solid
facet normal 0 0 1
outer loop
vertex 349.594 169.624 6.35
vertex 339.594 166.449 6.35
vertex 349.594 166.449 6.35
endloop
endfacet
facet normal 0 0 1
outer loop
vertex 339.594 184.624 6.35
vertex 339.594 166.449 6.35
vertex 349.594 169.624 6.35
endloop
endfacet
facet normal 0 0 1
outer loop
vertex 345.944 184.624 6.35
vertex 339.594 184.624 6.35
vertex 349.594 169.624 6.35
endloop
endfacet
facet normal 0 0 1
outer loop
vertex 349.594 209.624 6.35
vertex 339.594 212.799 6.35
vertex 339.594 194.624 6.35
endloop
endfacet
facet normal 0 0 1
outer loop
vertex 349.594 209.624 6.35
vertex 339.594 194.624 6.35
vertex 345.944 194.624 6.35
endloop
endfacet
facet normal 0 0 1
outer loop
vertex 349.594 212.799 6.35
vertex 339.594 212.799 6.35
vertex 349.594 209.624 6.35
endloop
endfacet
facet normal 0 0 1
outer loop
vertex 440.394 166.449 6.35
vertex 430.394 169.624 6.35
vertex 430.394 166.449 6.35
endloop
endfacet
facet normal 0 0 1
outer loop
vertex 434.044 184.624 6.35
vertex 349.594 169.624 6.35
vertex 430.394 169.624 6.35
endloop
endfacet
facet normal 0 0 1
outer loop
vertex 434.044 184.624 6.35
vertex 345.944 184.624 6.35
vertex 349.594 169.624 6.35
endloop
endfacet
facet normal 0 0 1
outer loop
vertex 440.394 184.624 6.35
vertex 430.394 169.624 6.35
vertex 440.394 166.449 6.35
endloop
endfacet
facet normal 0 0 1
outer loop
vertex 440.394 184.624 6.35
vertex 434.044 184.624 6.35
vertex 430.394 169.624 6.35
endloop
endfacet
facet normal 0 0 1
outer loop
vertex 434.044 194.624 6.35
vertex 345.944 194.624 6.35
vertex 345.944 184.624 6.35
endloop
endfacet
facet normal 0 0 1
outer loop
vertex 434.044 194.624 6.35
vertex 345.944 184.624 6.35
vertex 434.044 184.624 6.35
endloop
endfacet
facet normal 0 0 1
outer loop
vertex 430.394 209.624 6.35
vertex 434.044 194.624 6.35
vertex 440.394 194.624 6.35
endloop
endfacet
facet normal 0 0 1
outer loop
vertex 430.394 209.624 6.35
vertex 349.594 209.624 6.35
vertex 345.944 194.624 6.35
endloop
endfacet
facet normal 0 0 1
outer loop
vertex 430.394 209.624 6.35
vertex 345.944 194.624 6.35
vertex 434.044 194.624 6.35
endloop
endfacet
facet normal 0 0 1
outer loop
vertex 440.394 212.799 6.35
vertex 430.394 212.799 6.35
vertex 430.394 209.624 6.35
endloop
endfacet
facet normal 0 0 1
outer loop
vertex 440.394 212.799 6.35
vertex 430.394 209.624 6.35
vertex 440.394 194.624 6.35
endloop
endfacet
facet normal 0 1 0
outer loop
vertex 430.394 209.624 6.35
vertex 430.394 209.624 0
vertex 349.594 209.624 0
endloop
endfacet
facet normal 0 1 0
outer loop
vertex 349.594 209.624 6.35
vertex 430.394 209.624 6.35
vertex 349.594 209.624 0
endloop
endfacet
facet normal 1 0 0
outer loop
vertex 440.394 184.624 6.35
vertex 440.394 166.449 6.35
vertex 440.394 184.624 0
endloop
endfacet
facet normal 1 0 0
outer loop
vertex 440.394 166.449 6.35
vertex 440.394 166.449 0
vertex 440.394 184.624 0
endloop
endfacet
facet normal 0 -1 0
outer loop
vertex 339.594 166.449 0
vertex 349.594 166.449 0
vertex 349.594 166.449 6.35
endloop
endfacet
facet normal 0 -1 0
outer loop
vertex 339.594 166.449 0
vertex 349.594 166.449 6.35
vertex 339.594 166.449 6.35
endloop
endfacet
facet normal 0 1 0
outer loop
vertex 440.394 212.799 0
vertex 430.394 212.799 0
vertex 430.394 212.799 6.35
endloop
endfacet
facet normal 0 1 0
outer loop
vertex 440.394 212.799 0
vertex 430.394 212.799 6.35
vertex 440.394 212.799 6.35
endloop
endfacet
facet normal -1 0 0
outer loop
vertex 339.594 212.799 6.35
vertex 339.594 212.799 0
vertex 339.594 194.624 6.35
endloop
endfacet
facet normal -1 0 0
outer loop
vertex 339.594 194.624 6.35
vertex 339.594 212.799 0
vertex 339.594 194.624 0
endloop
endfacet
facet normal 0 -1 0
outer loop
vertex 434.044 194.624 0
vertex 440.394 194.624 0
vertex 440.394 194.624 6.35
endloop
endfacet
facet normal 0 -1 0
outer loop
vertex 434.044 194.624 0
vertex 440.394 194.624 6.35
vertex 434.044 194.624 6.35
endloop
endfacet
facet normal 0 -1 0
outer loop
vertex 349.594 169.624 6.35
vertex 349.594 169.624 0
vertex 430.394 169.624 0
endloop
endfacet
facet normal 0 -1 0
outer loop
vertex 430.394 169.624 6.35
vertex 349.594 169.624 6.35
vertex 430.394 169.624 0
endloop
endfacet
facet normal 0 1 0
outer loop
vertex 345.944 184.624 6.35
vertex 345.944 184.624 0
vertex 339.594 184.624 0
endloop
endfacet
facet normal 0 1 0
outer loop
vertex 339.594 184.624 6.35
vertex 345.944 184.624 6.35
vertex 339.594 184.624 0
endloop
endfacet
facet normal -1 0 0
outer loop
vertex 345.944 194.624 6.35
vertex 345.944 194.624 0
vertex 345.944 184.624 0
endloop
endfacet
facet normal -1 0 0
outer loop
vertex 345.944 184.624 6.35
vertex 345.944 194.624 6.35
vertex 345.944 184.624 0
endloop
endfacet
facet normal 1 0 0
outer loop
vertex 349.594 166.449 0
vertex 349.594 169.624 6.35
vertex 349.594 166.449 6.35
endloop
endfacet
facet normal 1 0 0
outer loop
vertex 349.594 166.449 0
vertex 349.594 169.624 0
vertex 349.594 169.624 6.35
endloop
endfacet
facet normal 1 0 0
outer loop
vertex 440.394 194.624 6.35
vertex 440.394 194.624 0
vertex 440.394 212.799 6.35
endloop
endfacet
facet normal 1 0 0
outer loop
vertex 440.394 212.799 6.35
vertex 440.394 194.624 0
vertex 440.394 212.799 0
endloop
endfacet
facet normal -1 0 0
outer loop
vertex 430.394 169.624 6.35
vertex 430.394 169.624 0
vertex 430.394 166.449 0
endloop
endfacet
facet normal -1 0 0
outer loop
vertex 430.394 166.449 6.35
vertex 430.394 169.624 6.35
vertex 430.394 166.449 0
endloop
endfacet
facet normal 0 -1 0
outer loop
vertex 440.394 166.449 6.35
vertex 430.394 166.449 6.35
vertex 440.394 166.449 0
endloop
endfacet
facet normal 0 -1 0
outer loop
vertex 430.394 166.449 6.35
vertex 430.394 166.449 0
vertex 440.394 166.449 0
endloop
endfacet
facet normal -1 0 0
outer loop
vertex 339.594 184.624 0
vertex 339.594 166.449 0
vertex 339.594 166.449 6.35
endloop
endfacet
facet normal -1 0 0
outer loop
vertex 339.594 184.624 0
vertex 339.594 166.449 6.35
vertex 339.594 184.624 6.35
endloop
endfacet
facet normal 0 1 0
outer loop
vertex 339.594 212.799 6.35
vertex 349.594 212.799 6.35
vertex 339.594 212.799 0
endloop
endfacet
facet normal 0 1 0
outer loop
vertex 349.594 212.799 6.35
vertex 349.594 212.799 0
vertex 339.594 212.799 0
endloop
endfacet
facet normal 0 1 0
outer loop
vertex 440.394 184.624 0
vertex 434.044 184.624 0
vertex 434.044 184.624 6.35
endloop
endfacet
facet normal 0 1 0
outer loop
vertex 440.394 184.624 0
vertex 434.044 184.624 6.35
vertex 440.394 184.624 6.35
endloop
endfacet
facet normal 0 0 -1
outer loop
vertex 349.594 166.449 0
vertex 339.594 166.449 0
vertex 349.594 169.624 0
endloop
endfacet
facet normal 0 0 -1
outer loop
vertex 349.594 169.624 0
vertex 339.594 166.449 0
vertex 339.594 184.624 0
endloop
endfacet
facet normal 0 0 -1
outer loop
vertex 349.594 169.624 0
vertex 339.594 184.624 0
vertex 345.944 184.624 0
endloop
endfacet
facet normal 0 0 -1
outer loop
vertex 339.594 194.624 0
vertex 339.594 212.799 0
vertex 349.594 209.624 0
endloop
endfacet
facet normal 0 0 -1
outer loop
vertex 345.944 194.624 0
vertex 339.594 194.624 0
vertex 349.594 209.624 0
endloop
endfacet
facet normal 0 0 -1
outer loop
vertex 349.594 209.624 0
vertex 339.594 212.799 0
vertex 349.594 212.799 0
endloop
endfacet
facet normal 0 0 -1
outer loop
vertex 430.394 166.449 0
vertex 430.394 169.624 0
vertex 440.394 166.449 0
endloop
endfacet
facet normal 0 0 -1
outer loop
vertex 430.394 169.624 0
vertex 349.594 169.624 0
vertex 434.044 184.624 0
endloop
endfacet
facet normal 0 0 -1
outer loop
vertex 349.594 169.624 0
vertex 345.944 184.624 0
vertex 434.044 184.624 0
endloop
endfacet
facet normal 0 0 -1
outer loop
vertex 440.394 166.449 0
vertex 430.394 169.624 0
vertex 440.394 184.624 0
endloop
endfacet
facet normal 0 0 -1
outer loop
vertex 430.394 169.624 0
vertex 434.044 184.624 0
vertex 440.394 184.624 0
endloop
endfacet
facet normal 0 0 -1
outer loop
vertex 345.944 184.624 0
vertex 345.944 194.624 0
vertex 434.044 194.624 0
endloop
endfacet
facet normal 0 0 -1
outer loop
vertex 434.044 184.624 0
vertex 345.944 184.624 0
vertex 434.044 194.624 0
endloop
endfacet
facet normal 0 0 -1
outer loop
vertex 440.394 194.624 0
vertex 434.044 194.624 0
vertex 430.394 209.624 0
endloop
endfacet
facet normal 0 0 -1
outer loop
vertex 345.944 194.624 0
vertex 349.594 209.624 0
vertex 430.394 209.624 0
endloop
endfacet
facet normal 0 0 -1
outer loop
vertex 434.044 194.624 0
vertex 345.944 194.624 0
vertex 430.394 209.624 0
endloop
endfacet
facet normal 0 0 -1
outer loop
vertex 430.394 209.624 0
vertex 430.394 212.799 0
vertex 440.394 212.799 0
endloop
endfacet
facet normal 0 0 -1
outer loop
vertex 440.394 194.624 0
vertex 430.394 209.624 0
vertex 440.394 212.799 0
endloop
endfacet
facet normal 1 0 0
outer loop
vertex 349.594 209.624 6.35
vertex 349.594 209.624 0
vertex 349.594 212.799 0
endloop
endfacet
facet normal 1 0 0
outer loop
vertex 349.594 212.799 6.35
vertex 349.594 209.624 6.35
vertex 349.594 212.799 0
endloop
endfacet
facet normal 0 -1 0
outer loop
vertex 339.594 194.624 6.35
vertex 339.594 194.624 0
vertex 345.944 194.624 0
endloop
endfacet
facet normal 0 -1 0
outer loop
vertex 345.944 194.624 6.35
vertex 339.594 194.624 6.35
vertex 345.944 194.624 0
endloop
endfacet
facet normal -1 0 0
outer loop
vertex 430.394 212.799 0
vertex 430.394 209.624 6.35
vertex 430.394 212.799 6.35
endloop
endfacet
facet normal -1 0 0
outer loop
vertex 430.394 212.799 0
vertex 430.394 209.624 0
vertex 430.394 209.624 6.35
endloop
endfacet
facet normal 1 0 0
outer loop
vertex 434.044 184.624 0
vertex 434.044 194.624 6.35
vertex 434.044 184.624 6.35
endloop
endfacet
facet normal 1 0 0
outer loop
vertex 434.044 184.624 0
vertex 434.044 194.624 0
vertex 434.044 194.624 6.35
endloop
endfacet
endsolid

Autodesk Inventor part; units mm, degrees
ref_plane "YZ Plane" through (0, 0, 0) normal (1, 0, 0) x (0, 1, 0)
ref_plane "XZ Plane" through (0, 0, 0) normal (0, 1, 0) x (-1, 0, 0)
ref_plane "XY Plane" through (0, 0, 0) normal (0, 0, 1) x (1, 0, 0)
sketch "Sketch1" plane through (0, 0, 0) normal (0, 0, 1) x (1, 0, 0)
  line L0 (349.5941, 169.6239) -> (430.3941, 169.6239)
  line L1 (430.3941, 209.6239) -> (349.5941, 209.6239)
  line L2 (349.5941, 209.6239) -> (349.5941, 212.7989)
  line L3 (349.5941, 212.7989) -> (339.5941, 212.7989)
  line L4 (339.5941, 212.7989) -> (339.5941, 212.7989)
  line L5 (430.3941, 209.6239) -> (430.3941, 212.7989)
  line L6 (430.3941, 212.7989) -> (440.3941, 212.7989)
  line L7 (440.3941, 212.7989) -> (440.3941, 212.7989)
  line L8 (349.5941, 169.6239) -> (349.5941, 166.4489)
  line L9 (349.5941, 166.4489) -> (339.5941, 166.4489)
  line L10 (339.5941, 166.4489) -> (339.5941, 172.7989)
  line L11 (430.3941, 169.6239) -> (430.3941, 166.4489)
  line L12 (430.3941, 166.4489) -> (440.3941, 166.4489)
  line L13 (440.3941, 166.4489) -> (440.3941, 172.7989)
  line L14 (339.5941, 194.6239) -> (345.9441, 194.6239)
  line L15 (345.9441, 194.6239) -> (345.9441, 184.6239)
  line L16 (345.9441, 184.6239) -> (339.5941, 184.6239)
  line L17 (440.3941, 194.6239) -> (434.0441, 194.6239)
  line L18 (434.0441, 194.6239) -> (434.0441, 184.6239)
  line L19 (434.0441, 184.6239) -> (440.3941, 184.6239)
  line L20 (440.3941, 172.7989) -> (440.3941, 184.6239)
  line L21 (440.3941, 194.6239) -> (440.3941, 212.7989)
  line L22 (339.5941, 212.7989) -> (339.5941, 194.6239)
  line L23 (339.5941, 184.6239) -> (339.5941, 172.7989)
  line L24 (389.9941, 209.6239) -> (389.9941, 169.6239)
  point P0 (0, 0)
  point P1 (339.5941, 192.7989)
  point P2 (339.5941, 192.7989)
  point P3 (345.9441, 189.6239)
  point P4 (389.9941, 189.6239)
  point P5 (434.0441, 189.6239)
  dimension "d16" = 6.35
  dimension "d0" = 40
  dimension "d1" = 100.8
  dimension "d2" = 10
  dimension "d3" = 6.35
  dimension "d4" = 6.35
  dimension "d5" = 10
  dimension "d6" = 10
  dimension "d7" = 10
  dimension "d8" = 10
  dimension "d9" = 3.175
  dimension "d10" = 3.175
  dimension "d11" = 3.175
  dimension "d12" = 3.175
  dimension "d13" = 10
  dimension "d14" = 6.35
  dimension "d15" = 6.35
extrude "Extrusion1" add sketch "Sketch1" along normal blind 6.35
properties part number "boxFront"
